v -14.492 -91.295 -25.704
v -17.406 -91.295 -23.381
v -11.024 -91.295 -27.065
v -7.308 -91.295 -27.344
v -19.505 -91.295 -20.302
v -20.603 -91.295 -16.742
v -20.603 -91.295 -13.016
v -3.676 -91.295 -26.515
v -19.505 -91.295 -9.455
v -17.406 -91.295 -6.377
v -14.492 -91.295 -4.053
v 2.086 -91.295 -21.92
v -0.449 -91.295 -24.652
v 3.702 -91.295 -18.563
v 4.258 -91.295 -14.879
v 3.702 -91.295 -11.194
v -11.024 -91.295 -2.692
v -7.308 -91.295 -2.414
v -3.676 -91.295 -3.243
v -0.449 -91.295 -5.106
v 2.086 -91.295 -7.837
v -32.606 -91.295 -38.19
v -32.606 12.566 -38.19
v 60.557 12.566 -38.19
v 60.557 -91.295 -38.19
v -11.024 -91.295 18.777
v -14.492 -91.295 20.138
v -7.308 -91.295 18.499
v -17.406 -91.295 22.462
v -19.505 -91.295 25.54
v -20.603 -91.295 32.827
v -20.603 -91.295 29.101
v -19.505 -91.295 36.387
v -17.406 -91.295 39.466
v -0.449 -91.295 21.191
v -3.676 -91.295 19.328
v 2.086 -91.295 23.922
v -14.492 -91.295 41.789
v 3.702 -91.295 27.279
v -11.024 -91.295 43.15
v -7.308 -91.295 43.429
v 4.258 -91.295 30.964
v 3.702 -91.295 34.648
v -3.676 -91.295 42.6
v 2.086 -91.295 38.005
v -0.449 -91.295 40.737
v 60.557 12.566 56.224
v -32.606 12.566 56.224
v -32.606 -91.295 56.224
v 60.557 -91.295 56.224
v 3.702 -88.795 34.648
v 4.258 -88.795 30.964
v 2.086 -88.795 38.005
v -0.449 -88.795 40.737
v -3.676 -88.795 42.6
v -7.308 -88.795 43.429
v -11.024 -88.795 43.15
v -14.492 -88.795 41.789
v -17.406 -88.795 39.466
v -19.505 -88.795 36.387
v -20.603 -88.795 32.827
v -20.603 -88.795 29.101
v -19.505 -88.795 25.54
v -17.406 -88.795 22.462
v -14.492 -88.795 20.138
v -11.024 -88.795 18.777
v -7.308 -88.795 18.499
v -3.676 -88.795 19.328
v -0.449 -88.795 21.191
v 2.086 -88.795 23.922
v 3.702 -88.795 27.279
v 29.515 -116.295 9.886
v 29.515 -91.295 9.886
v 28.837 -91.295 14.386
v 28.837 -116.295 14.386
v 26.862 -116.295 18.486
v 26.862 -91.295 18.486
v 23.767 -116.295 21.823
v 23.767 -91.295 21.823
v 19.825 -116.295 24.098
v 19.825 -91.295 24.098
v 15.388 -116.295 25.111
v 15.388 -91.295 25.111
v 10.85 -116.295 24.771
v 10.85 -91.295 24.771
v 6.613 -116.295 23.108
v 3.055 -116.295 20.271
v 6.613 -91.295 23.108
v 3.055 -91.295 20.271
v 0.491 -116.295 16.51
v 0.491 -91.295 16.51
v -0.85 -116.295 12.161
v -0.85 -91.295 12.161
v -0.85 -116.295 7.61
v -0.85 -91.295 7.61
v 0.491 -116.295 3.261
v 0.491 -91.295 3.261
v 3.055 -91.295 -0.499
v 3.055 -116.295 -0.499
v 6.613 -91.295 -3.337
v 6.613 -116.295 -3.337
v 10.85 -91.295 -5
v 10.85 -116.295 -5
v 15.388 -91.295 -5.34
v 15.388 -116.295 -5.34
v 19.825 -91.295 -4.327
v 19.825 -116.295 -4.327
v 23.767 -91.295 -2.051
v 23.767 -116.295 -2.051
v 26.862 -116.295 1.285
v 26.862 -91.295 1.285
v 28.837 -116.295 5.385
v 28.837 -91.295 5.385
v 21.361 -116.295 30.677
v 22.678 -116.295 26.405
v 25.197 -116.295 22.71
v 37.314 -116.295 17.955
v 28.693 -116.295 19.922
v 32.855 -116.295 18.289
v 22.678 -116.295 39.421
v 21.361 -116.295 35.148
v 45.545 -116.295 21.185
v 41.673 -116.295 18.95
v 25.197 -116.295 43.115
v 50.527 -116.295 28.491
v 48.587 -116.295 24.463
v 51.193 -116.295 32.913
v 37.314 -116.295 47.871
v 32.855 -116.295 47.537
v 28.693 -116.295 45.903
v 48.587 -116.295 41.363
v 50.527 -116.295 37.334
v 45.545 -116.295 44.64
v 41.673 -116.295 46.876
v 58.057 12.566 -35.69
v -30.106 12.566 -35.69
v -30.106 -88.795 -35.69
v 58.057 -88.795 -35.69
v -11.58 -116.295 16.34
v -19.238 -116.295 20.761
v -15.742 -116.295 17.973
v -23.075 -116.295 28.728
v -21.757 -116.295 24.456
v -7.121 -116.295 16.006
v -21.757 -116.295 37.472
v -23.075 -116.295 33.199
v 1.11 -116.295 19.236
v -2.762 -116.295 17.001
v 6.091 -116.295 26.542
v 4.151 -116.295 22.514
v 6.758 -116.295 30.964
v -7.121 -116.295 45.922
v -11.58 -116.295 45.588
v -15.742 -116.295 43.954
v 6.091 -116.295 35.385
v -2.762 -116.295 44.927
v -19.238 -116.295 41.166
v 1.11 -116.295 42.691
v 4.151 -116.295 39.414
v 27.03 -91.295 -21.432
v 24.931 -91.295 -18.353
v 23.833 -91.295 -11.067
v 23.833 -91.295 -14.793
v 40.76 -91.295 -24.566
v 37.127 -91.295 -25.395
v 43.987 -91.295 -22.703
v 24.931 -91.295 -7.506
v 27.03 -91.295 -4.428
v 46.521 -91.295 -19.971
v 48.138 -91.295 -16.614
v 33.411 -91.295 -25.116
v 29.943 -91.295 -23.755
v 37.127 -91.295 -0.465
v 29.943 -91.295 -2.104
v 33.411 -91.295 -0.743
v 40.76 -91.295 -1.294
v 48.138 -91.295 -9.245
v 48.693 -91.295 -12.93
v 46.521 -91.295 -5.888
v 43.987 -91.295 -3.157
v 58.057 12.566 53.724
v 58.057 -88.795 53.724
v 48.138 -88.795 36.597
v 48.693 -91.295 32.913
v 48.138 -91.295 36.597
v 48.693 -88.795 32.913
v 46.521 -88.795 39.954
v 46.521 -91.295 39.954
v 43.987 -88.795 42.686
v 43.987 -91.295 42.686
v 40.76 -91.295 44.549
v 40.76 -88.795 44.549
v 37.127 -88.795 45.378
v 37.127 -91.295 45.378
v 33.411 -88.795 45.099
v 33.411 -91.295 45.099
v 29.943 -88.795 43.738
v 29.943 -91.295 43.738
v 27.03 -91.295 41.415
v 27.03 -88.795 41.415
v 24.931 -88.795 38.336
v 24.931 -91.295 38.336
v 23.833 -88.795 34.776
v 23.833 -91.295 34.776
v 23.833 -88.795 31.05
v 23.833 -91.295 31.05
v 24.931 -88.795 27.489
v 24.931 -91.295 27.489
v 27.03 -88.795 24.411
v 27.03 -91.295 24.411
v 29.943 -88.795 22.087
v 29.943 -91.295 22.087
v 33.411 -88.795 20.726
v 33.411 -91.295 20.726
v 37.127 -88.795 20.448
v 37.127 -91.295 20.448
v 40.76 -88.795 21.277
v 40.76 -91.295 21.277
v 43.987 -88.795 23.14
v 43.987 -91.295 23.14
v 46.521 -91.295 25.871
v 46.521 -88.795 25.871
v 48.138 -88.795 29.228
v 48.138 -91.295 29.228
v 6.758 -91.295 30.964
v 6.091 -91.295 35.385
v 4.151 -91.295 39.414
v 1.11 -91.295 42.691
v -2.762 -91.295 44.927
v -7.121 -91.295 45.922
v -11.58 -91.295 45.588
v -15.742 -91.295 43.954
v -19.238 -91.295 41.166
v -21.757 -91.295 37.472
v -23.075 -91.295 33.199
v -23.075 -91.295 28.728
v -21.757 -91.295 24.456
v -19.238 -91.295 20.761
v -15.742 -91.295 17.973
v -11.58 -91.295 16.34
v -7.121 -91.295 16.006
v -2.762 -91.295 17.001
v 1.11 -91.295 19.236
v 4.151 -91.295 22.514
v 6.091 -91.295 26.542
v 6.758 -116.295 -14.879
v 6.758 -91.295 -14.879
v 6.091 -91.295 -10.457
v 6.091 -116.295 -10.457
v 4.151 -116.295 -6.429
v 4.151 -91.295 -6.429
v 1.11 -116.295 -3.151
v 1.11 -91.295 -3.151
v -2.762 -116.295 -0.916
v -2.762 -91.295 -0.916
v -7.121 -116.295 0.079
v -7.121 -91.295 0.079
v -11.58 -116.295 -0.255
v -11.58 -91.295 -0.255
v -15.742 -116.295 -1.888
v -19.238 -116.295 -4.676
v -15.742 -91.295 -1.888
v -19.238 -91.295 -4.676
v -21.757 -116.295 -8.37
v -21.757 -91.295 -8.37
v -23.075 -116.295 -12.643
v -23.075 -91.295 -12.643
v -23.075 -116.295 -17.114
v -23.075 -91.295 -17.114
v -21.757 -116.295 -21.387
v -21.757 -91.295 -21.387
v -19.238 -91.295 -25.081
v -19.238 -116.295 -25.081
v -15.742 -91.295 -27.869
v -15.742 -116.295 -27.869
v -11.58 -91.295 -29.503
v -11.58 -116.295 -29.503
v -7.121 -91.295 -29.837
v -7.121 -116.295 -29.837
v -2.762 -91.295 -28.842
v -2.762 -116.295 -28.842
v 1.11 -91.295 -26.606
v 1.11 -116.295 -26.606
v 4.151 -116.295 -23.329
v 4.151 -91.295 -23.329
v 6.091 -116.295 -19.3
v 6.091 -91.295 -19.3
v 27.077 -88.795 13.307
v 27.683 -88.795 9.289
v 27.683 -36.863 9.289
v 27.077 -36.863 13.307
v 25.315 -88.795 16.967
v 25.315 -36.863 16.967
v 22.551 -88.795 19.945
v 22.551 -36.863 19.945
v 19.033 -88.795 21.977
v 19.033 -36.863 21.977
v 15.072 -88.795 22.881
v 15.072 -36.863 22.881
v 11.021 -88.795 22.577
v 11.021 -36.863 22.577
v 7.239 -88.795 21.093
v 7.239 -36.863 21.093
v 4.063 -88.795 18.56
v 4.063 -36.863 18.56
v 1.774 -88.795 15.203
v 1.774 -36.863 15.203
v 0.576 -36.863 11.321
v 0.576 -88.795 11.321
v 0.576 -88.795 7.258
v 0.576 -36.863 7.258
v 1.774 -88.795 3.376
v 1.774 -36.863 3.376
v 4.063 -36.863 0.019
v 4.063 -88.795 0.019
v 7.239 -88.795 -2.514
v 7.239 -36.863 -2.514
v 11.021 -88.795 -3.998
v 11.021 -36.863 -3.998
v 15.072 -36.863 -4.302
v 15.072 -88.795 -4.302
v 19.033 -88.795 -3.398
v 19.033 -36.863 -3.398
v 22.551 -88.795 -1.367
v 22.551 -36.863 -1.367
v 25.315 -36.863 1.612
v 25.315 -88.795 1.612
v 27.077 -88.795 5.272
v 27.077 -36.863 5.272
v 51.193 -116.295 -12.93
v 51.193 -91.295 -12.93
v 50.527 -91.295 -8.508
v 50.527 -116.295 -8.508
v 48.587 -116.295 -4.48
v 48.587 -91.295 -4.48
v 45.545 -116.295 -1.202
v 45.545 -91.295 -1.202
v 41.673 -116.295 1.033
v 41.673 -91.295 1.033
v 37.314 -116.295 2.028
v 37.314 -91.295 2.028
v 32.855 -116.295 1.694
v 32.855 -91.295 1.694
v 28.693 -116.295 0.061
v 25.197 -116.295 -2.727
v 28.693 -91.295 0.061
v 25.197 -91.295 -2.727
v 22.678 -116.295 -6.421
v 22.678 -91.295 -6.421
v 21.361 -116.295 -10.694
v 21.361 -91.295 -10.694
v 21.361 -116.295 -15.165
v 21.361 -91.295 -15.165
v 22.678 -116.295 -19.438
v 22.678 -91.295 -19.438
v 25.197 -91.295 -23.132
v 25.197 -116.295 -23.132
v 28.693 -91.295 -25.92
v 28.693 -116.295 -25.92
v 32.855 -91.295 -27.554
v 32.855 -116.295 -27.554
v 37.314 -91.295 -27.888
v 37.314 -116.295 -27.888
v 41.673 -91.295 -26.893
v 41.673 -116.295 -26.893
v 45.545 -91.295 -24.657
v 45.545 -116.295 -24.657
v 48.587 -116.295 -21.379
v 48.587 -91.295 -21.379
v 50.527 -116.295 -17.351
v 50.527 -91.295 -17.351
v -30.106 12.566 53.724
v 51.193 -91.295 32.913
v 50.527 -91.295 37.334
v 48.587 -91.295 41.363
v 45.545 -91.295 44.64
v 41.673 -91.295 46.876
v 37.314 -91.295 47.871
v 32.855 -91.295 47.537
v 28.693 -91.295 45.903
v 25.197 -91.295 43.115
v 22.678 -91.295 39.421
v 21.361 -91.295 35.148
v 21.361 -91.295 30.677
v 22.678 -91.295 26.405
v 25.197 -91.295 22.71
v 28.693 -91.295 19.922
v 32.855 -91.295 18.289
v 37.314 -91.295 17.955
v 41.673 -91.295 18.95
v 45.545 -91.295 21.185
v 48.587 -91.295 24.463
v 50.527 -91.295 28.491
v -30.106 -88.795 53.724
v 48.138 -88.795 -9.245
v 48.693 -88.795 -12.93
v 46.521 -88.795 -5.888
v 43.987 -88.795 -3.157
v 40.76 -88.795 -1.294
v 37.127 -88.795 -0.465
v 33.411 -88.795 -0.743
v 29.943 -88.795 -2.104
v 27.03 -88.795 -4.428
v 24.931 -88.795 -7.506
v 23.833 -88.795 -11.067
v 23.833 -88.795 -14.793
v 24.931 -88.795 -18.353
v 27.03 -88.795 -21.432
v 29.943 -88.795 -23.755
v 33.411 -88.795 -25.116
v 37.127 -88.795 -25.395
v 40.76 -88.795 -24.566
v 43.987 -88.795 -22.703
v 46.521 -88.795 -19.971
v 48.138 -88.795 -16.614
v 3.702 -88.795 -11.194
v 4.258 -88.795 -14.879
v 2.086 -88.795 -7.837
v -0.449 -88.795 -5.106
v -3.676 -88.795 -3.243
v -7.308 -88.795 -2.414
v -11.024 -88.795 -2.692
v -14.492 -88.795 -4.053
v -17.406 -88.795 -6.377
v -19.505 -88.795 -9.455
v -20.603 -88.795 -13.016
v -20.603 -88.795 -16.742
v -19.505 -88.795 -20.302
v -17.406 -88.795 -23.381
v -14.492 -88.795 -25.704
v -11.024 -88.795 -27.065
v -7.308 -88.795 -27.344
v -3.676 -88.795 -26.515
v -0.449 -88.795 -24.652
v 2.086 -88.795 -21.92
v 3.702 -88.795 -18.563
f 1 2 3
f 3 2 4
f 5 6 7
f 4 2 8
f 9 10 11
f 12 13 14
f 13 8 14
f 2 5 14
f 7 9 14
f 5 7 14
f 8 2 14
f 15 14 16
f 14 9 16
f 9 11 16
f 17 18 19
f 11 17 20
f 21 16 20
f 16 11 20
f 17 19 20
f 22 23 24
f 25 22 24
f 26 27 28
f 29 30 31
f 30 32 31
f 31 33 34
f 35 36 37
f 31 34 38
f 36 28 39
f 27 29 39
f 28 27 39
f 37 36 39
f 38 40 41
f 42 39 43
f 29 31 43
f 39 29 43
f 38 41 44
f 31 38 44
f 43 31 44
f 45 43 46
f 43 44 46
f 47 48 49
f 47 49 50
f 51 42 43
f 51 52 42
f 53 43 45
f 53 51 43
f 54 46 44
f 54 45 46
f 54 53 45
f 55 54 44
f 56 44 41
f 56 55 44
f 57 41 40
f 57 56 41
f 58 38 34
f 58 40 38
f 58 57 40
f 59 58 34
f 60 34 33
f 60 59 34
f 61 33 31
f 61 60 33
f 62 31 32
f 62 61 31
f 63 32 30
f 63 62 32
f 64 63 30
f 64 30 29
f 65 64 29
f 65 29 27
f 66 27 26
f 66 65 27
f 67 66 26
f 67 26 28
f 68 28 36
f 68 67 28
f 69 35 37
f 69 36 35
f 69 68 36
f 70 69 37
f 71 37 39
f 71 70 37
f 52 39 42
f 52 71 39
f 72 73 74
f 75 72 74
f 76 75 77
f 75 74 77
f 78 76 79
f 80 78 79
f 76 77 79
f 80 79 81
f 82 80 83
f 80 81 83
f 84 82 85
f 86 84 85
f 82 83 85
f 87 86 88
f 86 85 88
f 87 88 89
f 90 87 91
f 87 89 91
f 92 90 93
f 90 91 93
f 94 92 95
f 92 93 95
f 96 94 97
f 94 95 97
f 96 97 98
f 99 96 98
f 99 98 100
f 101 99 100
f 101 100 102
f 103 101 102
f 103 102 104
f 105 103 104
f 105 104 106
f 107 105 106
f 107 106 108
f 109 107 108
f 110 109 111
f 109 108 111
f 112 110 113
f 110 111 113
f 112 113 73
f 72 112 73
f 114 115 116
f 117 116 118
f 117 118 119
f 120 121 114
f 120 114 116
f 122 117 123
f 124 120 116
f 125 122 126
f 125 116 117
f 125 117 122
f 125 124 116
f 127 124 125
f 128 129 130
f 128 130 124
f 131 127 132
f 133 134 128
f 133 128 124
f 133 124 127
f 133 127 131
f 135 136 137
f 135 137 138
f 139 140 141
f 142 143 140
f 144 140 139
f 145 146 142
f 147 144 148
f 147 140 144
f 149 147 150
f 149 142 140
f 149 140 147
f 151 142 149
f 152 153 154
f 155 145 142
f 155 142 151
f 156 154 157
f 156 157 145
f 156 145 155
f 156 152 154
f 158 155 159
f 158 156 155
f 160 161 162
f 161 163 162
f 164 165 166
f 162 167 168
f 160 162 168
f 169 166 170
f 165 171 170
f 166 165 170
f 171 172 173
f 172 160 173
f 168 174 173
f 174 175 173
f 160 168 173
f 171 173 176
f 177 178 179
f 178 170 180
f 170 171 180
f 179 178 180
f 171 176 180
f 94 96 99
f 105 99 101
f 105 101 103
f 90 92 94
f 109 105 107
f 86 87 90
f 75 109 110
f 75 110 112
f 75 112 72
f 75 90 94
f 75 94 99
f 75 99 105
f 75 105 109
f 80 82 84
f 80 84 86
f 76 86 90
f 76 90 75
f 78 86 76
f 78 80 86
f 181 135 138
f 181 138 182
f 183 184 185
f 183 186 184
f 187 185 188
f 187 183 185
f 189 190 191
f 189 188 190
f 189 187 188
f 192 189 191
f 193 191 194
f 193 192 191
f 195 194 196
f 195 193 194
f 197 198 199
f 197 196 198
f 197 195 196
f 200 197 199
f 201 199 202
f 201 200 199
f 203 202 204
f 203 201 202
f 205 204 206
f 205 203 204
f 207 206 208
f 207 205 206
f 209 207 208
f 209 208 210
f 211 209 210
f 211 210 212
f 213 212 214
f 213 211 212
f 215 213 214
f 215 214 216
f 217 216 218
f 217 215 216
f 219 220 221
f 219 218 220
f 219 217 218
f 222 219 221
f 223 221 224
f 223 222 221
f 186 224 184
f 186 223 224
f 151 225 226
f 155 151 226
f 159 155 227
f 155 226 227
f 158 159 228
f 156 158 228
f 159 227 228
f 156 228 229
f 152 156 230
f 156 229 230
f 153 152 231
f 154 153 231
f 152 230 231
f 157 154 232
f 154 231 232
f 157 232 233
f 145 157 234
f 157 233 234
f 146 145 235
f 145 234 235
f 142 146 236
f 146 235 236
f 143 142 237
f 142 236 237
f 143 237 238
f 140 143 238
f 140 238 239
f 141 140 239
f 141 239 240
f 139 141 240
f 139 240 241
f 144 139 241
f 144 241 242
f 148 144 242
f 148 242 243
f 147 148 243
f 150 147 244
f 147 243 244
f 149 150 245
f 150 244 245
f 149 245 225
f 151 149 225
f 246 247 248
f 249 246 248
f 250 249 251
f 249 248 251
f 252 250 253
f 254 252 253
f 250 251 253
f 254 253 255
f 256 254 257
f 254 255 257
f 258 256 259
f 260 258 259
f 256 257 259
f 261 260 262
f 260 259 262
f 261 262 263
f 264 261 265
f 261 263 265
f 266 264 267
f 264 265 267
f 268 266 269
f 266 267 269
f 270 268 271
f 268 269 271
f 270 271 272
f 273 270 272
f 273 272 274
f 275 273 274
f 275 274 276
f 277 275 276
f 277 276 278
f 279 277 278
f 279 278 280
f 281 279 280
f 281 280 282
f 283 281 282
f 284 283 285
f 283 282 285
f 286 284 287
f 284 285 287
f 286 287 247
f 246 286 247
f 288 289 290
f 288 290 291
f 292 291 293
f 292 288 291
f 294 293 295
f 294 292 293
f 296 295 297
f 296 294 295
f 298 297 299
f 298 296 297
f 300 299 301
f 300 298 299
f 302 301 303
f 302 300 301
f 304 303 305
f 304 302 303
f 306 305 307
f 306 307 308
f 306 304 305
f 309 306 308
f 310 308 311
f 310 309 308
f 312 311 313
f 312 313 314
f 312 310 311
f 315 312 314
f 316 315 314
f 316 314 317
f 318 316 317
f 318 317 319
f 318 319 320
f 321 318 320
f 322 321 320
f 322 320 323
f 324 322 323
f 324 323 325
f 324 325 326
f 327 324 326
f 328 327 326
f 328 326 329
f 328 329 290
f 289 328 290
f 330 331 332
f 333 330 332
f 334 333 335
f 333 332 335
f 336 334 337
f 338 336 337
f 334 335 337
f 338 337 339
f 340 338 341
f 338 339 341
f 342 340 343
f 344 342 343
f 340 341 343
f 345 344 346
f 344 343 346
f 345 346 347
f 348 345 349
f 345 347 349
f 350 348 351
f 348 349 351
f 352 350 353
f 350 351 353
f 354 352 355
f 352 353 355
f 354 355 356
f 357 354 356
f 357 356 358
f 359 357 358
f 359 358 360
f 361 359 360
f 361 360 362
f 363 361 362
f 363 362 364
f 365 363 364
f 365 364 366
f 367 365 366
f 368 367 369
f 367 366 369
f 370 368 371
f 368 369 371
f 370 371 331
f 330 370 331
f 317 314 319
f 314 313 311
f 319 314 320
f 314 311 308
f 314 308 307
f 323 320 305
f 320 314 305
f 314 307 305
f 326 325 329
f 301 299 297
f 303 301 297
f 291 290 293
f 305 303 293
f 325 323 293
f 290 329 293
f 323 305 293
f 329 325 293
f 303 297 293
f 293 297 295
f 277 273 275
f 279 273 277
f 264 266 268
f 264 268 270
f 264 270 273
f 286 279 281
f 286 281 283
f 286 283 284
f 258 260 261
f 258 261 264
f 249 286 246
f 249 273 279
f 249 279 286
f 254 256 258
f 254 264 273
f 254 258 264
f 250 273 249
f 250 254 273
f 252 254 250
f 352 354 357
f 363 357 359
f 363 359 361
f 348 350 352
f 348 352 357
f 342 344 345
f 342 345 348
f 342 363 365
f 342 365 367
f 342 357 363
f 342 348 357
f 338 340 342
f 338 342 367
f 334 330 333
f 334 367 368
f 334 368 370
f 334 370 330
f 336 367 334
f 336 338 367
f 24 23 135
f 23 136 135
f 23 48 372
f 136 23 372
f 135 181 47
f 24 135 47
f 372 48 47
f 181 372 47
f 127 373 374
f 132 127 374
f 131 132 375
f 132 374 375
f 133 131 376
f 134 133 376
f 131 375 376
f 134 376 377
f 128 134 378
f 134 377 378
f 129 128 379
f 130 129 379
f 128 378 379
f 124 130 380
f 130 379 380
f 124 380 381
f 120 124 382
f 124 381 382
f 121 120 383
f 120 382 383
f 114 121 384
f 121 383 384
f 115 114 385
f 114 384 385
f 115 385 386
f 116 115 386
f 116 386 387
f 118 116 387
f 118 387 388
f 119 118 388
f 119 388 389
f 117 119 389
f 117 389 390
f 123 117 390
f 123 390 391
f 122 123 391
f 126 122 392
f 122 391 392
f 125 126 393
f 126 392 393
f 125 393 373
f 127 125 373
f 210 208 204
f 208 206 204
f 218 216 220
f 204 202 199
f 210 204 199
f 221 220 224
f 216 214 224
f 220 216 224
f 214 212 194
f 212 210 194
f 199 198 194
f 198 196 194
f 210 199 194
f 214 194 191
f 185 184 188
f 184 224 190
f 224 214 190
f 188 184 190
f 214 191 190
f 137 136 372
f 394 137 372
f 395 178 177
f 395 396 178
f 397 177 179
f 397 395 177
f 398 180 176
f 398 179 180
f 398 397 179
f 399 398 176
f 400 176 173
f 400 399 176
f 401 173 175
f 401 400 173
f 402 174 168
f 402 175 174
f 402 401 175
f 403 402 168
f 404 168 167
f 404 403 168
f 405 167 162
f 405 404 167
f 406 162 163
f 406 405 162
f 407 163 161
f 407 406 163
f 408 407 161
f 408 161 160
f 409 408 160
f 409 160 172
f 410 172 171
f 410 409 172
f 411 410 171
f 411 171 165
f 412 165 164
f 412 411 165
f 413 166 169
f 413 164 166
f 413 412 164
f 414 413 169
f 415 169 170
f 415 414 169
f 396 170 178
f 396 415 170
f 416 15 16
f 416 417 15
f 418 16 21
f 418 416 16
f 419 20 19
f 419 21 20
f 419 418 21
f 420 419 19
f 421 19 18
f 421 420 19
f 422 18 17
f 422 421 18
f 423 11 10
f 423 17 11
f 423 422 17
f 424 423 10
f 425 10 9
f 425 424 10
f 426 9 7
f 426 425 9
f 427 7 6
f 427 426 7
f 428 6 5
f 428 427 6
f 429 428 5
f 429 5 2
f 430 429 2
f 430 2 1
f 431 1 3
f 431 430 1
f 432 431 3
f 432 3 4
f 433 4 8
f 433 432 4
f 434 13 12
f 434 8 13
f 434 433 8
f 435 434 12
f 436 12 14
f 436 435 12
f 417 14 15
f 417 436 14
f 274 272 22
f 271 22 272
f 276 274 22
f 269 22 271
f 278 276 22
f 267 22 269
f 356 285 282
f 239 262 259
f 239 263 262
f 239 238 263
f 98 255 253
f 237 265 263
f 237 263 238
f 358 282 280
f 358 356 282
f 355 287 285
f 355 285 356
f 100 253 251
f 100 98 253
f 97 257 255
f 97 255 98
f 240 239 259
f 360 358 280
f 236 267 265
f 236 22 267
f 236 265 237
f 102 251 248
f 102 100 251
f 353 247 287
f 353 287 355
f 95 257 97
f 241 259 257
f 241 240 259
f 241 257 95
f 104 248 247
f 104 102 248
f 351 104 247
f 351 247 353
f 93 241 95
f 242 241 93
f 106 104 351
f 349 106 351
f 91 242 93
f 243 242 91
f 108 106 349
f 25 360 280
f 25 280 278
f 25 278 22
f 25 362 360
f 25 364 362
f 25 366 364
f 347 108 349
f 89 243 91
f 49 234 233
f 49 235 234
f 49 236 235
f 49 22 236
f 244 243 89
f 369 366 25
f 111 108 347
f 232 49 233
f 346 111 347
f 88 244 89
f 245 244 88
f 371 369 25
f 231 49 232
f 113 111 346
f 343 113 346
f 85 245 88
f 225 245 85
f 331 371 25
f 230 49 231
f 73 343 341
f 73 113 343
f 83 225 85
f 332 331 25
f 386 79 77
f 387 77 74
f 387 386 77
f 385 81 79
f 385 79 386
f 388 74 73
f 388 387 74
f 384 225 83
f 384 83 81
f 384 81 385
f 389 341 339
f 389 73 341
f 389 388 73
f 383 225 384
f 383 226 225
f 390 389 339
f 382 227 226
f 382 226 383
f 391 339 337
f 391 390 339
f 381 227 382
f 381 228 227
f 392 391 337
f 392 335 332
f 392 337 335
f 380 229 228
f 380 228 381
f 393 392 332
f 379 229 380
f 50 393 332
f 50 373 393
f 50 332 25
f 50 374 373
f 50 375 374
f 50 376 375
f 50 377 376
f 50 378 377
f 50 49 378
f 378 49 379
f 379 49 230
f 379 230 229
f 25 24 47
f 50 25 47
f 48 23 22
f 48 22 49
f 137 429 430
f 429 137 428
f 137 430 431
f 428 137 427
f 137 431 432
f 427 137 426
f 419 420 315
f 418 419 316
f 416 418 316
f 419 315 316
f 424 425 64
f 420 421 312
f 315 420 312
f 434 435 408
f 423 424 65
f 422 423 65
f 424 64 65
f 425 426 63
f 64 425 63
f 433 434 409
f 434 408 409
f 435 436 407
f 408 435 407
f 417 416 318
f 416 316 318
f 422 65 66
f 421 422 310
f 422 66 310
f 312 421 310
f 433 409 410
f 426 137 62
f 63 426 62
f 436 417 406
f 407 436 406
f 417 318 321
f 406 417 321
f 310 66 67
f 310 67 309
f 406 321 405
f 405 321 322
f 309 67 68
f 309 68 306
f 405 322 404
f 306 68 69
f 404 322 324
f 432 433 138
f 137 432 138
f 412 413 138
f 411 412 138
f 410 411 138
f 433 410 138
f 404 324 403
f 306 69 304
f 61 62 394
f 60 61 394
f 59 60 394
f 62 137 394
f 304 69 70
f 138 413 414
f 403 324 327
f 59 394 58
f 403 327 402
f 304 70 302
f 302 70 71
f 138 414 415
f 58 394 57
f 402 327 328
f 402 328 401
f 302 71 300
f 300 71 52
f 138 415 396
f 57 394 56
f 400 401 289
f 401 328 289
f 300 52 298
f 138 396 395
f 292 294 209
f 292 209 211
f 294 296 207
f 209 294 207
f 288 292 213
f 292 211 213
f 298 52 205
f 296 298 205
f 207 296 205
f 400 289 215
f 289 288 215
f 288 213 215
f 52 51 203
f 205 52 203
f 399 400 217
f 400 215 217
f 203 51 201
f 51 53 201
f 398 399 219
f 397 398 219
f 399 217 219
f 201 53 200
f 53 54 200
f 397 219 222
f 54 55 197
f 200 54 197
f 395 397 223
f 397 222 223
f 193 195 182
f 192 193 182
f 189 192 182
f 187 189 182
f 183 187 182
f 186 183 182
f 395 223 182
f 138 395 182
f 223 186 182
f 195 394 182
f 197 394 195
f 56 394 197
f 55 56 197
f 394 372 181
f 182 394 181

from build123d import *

# Parameters (mm, degrees)
F1_W      = 93.1631103158
F1_H      = 94.4140702486
F2_DEPTH  = 103.8612350821
F3_R      = 15
F4_DEPTH  = 25
F5_T      = -2.5
F6_DEPTH  = 25
F7_R      = 15.2680412387
F8_DEPTH  = 25
F9_R      = 13.6293819141
F10_DEPTH = 54.4321462512


with BuildPart() as f2:
    # F1 (on offset) → F2 (new body)
    with BuildSketch(Plane.XZ.offset(-12.5657636672)):
        with Locations((13.9752887189, 9.0170353651)):
            Rectangle(F1_W, F1_H)
    extrude(amount=F2_DEPTH)

    # F3 (on face) → F4 (join)
    with BuildSketch(Plane.XZ.offset(91.2954714149)):
        with Locations((36.1929880455, 32.9128091689)):
            Circle(F3_R)
        with Locations((36.1929880455, -12.9296954255)):
            Circle(F3_R)
        with Locations((-8.2424106076, -14.8787384387)):
            Circle(F3_R)
        with Locations((-8.2424106076, 30.9637661558)):
            Circle(F3_R)
    extrude(amount=F4_DEPTH)

    # F5
    f5_openings = [f2.faces().sort_by_distance(p)[0] for p in [
        (13.975289, 12.565764, 9.017035),
    ]]
    offset(amount=F5_T, openings=f5_openings, kind=Kind.INTERSECTION)

    # F3 (on face) → F6 (join)
    with BuildSketch(Plane.XZ.offset(91.2954714149)):
        with Locations((36.1929880455, 32.9128091689)):
            Circle(F3_R)
        with Locations((36.1929880455, -12.9296954255)):
            Circle(F3_R)
        with Locations((-8.2424106076, -14.8787384387)):
            Circle(F3_R)
        with Locations((-8.2424106076, 30.9637661558)):
            Circle(F3_R)
    extrude(amount=F6_DEPTH)

    # F7 (on face) → F8 (join)
    with BuildSketch(Plane.XZ.offset(91.2954714149)):
        with Locations((14.2471631989, 9.8856743425)):
            Circle(F7_R)
    extrude(amount=F8_DEPTH)

    # F9 (on face) → F10 (join)
    with BuildSketch(Plane.XZ.offset(91.2954714149)):
        with Locations((14.0535570681, 9.2893429101)):
            Circle(F9_R)
    extrude(amount=-F10_DEPTH)


solid = f2.part
